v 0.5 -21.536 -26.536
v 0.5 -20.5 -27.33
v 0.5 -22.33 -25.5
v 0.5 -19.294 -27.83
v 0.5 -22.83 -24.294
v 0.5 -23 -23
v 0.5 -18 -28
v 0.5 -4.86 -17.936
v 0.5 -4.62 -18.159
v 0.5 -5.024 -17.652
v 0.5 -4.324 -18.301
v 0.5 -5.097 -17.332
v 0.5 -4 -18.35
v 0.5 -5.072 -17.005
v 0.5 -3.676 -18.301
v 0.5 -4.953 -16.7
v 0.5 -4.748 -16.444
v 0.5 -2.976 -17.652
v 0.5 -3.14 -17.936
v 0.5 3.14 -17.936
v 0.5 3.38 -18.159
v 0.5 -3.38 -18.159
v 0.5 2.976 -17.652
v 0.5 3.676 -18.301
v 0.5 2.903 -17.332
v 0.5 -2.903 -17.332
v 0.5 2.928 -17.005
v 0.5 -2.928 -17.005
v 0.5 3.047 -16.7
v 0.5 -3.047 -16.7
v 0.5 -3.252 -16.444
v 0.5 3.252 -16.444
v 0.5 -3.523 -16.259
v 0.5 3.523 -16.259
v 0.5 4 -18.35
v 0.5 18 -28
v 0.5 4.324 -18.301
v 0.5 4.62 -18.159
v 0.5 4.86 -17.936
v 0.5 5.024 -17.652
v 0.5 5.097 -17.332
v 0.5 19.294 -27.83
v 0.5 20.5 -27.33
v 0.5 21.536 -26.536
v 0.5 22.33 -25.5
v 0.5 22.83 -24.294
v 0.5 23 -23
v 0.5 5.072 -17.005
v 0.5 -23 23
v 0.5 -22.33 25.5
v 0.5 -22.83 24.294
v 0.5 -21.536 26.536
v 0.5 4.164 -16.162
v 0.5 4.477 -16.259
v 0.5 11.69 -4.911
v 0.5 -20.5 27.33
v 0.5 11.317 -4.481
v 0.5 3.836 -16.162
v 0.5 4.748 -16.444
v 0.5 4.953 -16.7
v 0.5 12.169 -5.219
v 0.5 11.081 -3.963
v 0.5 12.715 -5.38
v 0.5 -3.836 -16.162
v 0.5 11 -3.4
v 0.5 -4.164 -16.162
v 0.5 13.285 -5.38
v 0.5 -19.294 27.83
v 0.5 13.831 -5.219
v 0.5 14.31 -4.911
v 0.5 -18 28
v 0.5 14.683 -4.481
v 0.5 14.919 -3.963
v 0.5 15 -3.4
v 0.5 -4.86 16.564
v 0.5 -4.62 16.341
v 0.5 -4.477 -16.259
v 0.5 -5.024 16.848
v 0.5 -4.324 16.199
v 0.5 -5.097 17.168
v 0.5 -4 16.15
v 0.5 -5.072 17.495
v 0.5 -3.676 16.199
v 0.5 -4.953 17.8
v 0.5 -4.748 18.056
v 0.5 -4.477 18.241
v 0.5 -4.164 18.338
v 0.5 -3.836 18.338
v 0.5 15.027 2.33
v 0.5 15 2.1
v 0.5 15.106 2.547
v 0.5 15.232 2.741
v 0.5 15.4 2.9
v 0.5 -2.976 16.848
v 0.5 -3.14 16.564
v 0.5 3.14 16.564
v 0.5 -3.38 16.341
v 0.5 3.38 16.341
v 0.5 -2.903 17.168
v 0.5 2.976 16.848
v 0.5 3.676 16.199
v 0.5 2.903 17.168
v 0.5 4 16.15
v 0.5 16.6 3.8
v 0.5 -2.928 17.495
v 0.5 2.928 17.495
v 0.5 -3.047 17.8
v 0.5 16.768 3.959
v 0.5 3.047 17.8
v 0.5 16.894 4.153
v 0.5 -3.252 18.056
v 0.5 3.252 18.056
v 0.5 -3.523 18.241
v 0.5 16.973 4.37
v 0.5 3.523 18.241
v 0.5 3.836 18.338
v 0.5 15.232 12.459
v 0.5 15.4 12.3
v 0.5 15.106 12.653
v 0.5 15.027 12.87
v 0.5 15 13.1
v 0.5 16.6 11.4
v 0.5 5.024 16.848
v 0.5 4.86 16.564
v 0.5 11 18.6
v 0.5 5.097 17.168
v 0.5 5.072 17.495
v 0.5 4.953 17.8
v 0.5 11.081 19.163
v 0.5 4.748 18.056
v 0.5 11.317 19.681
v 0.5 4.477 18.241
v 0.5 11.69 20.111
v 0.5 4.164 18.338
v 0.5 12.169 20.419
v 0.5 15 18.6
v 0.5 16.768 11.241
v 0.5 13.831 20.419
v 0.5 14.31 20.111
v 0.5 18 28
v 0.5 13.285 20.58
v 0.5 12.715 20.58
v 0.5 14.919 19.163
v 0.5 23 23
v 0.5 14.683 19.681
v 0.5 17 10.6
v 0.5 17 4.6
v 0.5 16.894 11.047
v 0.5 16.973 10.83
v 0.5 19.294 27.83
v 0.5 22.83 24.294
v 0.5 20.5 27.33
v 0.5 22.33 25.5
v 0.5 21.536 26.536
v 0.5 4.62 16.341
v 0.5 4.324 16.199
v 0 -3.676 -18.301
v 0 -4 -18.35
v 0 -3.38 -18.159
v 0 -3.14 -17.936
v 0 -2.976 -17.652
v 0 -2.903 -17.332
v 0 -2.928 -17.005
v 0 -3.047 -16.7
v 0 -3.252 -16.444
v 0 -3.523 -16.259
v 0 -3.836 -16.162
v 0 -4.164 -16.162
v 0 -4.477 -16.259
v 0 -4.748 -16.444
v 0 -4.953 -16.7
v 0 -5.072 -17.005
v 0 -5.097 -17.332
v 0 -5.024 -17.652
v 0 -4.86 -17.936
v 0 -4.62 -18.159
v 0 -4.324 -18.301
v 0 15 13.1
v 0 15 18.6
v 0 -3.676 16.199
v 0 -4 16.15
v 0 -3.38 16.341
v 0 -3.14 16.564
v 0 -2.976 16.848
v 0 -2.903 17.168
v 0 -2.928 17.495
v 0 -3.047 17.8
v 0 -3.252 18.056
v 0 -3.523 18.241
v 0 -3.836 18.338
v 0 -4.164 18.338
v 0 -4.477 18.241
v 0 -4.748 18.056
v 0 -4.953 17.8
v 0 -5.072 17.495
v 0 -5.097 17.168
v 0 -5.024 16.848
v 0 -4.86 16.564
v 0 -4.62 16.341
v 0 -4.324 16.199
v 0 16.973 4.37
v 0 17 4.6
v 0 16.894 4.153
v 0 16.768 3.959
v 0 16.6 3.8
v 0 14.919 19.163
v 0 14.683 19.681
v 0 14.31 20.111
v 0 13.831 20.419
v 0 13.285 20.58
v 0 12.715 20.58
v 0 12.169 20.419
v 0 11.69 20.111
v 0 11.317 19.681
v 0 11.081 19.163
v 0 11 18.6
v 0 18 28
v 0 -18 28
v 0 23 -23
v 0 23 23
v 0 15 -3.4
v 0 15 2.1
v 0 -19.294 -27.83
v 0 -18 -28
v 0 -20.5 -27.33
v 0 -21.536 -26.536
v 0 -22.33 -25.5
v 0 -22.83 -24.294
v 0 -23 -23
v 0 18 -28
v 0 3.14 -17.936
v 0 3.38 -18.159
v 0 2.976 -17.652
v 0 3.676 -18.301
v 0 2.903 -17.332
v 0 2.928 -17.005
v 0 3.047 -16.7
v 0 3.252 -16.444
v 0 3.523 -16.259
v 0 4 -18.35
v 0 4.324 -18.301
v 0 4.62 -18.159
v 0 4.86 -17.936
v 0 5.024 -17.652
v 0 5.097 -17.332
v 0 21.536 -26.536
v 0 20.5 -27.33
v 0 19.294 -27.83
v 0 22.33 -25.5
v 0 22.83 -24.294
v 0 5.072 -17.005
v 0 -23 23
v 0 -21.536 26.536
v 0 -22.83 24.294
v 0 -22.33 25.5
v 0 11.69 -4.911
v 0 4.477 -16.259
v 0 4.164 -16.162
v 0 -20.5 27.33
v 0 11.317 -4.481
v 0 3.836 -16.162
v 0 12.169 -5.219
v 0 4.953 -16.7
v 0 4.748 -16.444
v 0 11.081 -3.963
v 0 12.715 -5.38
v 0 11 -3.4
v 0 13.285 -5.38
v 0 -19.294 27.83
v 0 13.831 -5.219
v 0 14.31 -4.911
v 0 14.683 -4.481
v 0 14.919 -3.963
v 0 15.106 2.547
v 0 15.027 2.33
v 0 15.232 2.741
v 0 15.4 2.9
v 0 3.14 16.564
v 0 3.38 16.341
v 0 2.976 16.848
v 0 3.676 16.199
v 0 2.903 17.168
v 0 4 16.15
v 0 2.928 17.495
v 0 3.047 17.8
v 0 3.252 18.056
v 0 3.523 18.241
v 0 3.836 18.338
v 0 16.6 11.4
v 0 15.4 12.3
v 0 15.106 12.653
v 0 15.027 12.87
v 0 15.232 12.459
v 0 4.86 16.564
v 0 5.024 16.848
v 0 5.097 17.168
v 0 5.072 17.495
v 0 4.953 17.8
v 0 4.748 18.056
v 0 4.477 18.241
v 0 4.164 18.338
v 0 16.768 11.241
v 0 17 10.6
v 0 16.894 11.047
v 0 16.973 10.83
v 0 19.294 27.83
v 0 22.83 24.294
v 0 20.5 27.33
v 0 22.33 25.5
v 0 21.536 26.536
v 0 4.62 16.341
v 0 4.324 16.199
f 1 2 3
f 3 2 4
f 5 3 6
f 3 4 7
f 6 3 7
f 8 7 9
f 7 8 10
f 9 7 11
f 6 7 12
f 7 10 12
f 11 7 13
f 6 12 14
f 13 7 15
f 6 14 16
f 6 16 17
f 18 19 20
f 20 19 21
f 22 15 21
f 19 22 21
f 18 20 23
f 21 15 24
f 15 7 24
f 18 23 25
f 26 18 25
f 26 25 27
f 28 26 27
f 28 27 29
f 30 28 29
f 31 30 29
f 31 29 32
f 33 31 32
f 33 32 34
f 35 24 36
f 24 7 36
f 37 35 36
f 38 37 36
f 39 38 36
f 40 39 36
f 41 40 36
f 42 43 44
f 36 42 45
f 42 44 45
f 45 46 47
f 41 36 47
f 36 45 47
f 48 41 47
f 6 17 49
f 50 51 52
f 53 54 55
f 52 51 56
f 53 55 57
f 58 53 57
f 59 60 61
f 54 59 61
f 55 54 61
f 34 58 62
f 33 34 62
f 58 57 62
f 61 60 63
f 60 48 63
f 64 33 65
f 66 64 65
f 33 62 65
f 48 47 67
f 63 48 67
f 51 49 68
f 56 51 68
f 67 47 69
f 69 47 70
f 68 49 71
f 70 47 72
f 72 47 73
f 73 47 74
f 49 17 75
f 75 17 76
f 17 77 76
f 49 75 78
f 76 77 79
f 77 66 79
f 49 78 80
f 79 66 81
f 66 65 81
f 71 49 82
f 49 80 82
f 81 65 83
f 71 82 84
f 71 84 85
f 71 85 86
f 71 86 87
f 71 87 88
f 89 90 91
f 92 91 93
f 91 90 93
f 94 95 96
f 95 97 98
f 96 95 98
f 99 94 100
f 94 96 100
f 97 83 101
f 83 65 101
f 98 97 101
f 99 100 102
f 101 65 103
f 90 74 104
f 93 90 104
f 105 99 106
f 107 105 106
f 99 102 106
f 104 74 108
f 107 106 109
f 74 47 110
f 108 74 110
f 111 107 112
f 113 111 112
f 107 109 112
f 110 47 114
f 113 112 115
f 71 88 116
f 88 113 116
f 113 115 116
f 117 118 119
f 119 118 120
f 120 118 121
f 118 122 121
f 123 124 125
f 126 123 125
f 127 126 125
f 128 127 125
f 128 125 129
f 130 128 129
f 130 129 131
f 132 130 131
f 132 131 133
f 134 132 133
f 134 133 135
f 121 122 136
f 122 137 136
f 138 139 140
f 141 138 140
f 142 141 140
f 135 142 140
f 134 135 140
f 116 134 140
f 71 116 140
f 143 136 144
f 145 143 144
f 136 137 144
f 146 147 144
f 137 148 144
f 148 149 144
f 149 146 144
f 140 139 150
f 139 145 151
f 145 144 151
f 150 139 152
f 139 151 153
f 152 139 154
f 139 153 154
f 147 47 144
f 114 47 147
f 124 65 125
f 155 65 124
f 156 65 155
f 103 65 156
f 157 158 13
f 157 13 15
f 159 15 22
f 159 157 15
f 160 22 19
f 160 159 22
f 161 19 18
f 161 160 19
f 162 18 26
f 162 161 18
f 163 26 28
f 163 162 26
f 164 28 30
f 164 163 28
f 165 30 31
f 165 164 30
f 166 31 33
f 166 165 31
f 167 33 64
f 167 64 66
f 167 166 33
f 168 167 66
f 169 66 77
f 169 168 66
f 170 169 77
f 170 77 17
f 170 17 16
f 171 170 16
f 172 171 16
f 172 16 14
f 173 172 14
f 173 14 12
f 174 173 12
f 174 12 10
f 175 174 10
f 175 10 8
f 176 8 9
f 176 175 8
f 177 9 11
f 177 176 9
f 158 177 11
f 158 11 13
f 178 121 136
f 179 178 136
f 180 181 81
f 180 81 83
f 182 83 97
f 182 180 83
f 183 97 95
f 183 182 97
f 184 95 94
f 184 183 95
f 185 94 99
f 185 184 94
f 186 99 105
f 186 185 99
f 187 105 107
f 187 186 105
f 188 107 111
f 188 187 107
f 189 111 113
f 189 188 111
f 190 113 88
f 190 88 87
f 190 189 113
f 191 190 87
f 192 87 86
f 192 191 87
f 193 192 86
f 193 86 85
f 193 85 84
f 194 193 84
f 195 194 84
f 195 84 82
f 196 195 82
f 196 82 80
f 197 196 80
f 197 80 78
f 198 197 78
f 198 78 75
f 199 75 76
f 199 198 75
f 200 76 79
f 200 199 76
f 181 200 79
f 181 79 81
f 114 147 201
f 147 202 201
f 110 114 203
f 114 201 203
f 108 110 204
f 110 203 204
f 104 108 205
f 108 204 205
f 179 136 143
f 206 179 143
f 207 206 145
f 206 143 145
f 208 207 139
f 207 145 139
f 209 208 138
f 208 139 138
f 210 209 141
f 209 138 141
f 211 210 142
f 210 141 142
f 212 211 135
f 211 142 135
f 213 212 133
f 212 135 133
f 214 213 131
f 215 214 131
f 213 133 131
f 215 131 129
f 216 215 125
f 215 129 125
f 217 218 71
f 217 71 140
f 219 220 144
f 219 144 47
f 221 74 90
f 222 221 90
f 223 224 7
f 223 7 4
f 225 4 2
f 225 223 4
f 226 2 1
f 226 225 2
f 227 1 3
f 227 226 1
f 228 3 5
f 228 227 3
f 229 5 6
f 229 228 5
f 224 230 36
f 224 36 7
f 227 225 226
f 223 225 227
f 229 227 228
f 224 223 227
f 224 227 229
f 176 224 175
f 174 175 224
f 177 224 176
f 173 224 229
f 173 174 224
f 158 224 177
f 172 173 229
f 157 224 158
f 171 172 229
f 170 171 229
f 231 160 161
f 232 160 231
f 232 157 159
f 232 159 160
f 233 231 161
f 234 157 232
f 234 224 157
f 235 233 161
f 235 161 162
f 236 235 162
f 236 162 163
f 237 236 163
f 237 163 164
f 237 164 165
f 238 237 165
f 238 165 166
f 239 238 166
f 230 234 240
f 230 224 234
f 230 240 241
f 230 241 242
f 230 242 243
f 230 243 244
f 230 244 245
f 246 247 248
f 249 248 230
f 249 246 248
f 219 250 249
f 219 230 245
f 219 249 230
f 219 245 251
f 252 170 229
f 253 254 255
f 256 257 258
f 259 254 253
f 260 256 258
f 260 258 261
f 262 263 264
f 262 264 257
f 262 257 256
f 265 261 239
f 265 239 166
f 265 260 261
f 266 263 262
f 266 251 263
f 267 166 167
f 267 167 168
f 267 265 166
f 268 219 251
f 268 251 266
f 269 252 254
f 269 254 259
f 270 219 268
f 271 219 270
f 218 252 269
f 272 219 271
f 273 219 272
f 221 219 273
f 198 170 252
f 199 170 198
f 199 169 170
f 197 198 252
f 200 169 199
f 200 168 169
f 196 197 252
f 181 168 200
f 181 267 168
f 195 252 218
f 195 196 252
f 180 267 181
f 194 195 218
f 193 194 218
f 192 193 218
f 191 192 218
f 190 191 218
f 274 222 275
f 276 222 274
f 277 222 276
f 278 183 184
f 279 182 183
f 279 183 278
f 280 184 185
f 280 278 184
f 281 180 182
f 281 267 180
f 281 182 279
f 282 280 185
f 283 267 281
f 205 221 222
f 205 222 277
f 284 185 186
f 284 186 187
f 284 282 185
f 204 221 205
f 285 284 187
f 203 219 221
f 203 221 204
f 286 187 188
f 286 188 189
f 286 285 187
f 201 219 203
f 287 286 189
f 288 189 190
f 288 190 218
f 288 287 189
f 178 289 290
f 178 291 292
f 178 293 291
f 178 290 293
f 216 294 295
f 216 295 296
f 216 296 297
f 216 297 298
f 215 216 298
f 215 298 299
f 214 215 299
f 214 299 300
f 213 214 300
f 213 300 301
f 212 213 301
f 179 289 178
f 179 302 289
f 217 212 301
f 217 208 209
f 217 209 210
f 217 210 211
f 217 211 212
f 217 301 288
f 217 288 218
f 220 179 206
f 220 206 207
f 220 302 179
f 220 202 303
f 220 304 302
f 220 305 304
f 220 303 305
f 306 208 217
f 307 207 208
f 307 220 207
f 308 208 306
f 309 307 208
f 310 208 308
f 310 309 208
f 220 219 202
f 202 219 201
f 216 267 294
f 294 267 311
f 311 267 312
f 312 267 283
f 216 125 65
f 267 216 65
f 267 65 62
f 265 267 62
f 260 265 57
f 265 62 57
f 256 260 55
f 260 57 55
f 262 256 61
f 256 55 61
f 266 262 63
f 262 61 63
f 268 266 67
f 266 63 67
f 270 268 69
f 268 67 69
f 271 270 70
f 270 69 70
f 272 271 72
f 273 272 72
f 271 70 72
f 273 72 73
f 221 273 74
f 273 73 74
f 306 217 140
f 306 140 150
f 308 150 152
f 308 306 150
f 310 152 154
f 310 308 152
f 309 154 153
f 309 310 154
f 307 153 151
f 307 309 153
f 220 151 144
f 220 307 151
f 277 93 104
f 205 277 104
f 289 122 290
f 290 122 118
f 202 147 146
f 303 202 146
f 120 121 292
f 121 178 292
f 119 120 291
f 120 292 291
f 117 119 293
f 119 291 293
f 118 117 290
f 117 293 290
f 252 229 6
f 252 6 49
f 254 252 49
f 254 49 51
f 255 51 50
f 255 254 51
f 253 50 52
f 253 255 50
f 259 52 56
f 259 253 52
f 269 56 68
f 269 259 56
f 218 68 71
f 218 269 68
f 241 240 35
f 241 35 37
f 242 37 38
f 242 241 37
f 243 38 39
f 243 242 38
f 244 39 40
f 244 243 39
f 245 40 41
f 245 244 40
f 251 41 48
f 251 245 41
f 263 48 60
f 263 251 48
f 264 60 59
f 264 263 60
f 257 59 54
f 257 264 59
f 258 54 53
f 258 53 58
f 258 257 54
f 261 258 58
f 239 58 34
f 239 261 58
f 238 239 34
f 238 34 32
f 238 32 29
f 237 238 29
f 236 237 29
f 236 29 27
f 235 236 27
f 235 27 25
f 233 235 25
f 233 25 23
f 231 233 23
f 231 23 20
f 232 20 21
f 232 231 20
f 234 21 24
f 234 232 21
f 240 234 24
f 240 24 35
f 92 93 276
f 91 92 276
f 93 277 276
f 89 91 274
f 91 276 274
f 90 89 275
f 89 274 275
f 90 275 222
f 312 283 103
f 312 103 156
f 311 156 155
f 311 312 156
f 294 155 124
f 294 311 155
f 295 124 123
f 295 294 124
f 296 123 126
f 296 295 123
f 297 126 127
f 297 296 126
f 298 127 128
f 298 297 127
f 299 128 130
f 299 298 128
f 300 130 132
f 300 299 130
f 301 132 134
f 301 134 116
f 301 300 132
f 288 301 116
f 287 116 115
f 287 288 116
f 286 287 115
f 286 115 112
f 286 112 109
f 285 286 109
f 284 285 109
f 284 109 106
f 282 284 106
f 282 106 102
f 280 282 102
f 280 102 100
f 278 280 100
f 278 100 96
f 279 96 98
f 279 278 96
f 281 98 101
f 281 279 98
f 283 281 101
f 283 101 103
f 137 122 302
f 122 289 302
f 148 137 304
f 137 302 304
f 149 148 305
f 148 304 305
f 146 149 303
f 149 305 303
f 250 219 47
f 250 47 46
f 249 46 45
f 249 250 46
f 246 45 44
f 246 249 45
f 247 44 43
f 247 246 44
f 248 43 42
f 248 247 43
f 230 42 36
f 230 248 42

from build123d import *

# Parameters (mm, degrees)
SKETCH_1_R          = 1.1
EXTRUDE_1_DEPTH     = 0.5
CUT_EXTRUDE_1_DEPTH = 10
FILLET_1_R          = 1


with BuildPart() as part:
    # 草图1 → Extrude 1 (new body)
    with BuildSketch(Plane(origin=(0, 0, 0), x_dir=(0, 0, -1), z_dir=(1, 0, 0))):
        with BuildLine():
            Line((-23, 23), (23, 23))
            ThreePointArc((23, 23), (26.535533906, 21.535533906), (28, 18))
            Line((28, 18), (28, -18))
            ThreePointArc((28, -18), (26.535533906, -21.535533906), (23, -23))
            Line((23, -23), (-23, -23))
            ThreePointArc((-23, -23), (-26.535533906, -21.535533906), (-28, -18))
            Line((-28, -18), (-28, 18))
            ThreePointArc((-28, 18), (-26.535533906, 21.535533906), (-23, 23))
        make_face()
        with Locations((17.25, 4)):
            Circle(SKETCH_1_R, mode=Mode.SUBTRACT)
        with Locations((17.25, -4)):
            Circle(SKETCH_1_R, mode=Mode.SUBTRACT)
        with Locations((-17.25, -4)):
            Circle(SKETCH_1_R, mode=Mode.SUBTRACT)
        with Locations((-17.25, 4)):
            Circle(SKETCH_1_R, mode=Mode.SUBTRACT)
    extrude(amount=EXTRUDE_1_DEPTH)

    # 草图2 → 切除-拉伸1 (cut)
    with BuildSketch(Plane(origin=(0.5, 0, 0), x_dir=(0, 0, -1), z_dir=(1, 0, 0))):
        with BuildLine():
            Line((-18.6, 11), (3.4, 11))
            ThreePointArc((3.4, 11), (5.4, 13), (3.4, 15))
            Line((3.4, 15), (-18.6, 15))
            ThreePointArc((-18.6, 15), (-20.6, 13), (-18.6, 11))
        make_face()
        Polygon((-11.1, 17), (-12.6, 15), (-2.6, 15), (-4.1, 17), align=None)
    extrude(amount=-CUT_EXTRUDE_1_DEPTH, mode=Mode.SUBTRACT)

    # 圆角1
    fillet_1_edges = [part.edges().sort_by_distance(p)[0] for p in [
        (0.25, 15, 12.6),
        (0.25, 17, 11.1),
        (0.25, 17, 4.1),
        (0.25, 15, 2.6),
    ]]
    fillet(fillet_1_edges, radius=FILLET_1_R)


solid = part.part
